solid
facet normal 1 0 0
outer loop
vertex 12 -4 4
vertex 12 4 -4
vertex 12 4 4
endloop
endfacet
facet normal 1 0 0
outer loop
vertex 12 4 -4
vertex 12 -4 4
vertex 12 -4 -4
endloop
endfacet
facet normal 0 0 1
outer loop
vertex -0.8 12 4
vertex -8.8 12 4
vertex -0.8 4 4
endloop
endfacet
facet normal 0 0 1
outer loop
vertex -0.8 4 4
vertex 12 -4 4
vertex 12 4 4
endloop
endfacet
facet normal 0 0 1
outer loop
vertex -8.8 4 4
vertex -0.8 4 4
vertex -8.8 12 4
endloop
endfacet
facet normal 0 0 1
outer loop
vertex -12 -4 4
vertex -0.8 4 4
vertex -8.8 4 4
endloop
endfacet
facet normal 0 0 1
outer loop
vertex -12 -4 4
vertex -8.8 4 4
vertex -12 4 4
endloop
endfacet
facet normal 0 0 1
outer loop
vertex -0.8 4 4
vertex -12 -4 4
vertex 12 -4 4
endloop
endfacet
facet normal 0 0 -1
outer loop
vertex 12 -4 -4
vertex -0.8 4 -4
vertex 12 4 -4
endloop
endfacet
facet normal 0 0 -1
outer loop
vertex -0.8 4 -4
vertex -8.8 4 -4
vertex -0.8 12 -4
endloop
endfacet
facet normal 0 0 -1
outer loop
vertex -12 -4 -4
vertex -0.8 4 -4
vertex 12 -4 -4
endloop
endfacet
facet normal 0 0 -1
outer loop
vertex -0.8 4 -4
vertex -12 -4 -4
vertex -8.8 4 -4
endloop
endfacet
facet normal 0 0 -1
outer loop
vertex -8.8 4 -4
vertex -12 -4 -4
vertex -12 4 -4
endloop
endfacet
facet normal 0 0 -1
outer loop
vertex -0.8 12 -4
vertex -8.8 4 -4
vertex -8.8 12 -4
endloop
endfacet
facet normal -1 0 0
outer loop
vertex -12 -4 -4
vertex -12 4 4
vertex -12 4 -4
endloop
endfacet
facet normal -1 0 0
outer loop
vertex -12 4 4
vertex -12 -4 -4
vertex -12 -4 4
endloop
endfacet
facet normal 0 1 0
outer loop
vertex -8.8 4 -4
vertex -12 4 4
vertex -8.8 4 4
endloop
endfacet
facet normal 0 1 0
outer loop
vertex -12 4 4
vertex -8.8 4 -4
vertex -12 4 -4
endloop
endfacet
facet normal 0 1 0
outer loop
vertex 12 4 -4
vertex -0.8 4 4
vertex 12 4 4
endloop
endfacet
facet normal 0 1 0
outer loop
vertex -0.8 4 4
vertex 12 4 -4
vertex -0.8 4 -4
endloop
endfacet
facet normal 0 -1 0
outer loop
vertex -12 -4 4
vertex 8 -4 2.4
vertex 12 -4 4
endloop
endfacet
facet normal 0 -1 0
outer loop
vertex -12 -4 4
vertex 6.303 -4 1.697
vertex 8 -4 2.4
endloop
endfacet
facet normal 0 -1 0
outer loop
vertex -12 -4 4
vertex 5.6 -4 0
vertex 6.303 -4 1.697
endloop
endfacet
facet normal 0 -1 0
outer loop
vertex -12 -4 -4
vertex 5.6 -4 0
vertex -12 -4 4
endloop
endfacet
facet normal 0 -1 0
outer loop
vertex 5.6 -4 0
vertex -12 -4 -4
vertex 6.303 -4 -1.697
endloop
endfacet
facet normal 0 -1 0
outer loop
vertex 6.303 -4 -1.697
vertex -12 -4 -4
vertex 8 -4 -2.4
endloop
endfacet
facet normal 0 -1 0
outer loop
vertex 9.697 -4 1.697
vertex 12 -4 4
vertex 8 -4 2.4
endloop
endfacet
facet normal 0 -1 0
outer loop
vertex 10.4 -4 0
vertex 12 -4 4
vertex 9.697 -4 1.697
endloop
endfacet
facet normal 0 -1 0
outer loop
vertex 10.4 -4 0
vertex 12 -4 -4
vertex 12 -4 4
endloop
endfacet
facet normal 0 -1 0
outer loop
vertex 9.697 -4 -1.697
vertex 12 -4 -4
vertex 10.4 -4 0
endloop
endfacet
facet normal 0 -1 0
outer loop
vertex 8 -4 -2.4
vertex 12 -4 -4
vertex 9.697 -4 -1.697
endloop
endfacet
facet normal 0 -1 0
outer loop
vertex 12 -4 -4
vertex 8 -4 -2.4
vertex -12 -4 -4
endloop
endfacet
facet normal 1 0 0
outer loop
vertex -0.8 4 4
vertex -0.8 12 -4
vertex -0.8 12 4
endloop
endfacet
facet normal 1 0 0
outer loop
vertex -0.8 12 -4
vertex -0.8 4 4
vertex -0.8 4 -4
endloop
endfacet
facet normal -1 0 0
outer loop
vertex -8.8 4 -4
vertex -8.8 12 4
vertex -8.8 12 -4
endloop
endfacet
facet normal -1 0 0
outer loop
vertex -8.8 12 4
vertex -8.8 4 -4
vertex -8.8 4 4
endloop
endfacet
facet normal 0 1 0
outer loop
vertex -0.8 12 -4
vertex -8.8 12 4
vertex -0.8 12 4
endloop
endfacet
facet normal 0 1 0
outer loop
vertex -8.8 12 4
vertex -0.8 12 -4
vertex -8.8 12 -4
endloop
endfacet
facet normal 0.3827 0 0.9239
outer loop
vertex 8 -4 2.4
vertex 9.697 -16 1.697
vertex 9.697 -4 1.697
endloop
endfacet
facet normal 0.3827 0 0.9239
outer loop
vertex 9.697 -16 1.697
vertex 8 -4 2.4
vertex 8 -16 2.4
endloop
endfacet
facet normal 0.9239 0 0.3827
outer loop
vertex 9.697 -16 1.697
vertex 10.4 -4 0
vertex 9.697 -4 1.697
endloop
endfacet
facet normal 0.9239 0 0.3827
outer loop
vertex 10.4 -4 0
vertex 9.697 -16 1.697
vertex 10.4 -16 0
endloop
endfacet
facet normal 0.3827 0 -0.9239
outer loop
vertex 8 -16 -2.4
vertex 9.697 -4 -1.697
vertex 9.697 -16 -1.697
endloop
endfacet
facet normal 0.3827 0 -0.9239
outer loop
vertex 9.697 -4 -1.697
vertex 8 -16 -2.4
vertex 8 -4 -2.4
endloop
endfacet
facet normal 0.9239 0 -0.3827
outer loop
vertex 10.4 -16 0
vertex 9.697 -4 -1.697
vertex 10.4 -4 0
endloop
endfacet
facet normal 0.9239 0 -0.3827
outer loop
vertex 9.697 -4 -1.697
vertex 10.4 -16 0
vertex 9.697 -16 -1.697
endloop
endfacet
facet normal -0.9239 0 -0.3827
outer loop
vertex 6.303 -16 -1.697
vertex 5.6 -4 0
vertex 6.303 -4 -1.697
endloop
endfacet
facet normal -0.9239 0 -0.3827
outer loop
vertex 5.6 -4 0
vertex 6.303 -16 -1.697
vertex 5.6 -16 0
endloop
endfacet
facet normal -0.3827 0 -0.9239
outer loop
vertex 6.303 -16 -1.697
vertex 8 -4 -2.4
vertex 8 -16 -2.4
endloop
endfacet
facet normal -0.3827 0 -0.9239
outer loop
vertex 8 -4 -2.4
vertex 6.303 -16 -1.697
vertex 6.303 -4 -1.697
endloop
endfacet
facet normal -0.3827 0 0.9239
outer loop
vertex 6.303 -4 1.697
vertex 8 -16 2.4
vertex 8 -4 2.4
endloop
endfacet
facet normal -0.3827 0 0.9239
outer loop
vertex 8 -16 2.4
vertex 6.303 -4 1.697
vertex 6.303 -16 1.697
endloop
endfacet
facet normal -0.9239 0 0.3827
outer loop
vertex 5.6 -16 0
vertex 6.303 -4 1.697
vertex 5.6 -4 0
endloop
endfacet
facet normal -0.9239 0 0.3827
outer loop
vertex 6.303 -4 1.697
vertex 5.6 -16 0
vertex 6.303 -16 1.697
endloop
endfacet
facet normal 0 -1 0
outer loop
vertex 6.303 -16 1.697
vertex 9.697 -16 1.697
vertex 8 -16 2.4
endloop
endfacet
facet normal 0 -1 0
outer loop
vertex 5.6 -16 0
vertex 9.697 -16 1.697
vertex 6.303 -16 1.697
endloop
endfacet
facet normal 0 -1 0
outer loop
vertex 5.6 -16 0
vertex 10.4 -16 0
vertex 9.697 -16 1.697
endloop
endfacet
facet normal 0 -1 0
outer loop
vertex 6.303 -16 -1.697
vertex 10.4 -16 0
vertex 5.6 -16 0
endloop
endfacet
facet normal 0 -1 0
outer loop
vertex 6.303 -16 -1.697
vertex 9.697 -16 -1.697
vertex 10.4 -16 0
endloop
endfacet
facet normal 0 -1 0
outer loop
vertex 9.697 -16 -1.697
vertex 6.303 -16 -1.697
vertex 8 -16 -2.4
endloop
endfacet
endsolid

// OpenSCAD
size=32; //block=32 //item=8






cube([size*0.75,size*0.25,size*0.25],center=true);	//shaft

translate([-size*0.15,size*0.25,0]){	//knub
cube([size*0.25,size*0.25,size*0.25],center=true);
};	//translate

translate([size*0.25,-size*0.1,0]){	//handle
rotate([90,0,0]){
cylinder(d=size*0.15,h=size*0.4);
};	//rotate
};	//translate
